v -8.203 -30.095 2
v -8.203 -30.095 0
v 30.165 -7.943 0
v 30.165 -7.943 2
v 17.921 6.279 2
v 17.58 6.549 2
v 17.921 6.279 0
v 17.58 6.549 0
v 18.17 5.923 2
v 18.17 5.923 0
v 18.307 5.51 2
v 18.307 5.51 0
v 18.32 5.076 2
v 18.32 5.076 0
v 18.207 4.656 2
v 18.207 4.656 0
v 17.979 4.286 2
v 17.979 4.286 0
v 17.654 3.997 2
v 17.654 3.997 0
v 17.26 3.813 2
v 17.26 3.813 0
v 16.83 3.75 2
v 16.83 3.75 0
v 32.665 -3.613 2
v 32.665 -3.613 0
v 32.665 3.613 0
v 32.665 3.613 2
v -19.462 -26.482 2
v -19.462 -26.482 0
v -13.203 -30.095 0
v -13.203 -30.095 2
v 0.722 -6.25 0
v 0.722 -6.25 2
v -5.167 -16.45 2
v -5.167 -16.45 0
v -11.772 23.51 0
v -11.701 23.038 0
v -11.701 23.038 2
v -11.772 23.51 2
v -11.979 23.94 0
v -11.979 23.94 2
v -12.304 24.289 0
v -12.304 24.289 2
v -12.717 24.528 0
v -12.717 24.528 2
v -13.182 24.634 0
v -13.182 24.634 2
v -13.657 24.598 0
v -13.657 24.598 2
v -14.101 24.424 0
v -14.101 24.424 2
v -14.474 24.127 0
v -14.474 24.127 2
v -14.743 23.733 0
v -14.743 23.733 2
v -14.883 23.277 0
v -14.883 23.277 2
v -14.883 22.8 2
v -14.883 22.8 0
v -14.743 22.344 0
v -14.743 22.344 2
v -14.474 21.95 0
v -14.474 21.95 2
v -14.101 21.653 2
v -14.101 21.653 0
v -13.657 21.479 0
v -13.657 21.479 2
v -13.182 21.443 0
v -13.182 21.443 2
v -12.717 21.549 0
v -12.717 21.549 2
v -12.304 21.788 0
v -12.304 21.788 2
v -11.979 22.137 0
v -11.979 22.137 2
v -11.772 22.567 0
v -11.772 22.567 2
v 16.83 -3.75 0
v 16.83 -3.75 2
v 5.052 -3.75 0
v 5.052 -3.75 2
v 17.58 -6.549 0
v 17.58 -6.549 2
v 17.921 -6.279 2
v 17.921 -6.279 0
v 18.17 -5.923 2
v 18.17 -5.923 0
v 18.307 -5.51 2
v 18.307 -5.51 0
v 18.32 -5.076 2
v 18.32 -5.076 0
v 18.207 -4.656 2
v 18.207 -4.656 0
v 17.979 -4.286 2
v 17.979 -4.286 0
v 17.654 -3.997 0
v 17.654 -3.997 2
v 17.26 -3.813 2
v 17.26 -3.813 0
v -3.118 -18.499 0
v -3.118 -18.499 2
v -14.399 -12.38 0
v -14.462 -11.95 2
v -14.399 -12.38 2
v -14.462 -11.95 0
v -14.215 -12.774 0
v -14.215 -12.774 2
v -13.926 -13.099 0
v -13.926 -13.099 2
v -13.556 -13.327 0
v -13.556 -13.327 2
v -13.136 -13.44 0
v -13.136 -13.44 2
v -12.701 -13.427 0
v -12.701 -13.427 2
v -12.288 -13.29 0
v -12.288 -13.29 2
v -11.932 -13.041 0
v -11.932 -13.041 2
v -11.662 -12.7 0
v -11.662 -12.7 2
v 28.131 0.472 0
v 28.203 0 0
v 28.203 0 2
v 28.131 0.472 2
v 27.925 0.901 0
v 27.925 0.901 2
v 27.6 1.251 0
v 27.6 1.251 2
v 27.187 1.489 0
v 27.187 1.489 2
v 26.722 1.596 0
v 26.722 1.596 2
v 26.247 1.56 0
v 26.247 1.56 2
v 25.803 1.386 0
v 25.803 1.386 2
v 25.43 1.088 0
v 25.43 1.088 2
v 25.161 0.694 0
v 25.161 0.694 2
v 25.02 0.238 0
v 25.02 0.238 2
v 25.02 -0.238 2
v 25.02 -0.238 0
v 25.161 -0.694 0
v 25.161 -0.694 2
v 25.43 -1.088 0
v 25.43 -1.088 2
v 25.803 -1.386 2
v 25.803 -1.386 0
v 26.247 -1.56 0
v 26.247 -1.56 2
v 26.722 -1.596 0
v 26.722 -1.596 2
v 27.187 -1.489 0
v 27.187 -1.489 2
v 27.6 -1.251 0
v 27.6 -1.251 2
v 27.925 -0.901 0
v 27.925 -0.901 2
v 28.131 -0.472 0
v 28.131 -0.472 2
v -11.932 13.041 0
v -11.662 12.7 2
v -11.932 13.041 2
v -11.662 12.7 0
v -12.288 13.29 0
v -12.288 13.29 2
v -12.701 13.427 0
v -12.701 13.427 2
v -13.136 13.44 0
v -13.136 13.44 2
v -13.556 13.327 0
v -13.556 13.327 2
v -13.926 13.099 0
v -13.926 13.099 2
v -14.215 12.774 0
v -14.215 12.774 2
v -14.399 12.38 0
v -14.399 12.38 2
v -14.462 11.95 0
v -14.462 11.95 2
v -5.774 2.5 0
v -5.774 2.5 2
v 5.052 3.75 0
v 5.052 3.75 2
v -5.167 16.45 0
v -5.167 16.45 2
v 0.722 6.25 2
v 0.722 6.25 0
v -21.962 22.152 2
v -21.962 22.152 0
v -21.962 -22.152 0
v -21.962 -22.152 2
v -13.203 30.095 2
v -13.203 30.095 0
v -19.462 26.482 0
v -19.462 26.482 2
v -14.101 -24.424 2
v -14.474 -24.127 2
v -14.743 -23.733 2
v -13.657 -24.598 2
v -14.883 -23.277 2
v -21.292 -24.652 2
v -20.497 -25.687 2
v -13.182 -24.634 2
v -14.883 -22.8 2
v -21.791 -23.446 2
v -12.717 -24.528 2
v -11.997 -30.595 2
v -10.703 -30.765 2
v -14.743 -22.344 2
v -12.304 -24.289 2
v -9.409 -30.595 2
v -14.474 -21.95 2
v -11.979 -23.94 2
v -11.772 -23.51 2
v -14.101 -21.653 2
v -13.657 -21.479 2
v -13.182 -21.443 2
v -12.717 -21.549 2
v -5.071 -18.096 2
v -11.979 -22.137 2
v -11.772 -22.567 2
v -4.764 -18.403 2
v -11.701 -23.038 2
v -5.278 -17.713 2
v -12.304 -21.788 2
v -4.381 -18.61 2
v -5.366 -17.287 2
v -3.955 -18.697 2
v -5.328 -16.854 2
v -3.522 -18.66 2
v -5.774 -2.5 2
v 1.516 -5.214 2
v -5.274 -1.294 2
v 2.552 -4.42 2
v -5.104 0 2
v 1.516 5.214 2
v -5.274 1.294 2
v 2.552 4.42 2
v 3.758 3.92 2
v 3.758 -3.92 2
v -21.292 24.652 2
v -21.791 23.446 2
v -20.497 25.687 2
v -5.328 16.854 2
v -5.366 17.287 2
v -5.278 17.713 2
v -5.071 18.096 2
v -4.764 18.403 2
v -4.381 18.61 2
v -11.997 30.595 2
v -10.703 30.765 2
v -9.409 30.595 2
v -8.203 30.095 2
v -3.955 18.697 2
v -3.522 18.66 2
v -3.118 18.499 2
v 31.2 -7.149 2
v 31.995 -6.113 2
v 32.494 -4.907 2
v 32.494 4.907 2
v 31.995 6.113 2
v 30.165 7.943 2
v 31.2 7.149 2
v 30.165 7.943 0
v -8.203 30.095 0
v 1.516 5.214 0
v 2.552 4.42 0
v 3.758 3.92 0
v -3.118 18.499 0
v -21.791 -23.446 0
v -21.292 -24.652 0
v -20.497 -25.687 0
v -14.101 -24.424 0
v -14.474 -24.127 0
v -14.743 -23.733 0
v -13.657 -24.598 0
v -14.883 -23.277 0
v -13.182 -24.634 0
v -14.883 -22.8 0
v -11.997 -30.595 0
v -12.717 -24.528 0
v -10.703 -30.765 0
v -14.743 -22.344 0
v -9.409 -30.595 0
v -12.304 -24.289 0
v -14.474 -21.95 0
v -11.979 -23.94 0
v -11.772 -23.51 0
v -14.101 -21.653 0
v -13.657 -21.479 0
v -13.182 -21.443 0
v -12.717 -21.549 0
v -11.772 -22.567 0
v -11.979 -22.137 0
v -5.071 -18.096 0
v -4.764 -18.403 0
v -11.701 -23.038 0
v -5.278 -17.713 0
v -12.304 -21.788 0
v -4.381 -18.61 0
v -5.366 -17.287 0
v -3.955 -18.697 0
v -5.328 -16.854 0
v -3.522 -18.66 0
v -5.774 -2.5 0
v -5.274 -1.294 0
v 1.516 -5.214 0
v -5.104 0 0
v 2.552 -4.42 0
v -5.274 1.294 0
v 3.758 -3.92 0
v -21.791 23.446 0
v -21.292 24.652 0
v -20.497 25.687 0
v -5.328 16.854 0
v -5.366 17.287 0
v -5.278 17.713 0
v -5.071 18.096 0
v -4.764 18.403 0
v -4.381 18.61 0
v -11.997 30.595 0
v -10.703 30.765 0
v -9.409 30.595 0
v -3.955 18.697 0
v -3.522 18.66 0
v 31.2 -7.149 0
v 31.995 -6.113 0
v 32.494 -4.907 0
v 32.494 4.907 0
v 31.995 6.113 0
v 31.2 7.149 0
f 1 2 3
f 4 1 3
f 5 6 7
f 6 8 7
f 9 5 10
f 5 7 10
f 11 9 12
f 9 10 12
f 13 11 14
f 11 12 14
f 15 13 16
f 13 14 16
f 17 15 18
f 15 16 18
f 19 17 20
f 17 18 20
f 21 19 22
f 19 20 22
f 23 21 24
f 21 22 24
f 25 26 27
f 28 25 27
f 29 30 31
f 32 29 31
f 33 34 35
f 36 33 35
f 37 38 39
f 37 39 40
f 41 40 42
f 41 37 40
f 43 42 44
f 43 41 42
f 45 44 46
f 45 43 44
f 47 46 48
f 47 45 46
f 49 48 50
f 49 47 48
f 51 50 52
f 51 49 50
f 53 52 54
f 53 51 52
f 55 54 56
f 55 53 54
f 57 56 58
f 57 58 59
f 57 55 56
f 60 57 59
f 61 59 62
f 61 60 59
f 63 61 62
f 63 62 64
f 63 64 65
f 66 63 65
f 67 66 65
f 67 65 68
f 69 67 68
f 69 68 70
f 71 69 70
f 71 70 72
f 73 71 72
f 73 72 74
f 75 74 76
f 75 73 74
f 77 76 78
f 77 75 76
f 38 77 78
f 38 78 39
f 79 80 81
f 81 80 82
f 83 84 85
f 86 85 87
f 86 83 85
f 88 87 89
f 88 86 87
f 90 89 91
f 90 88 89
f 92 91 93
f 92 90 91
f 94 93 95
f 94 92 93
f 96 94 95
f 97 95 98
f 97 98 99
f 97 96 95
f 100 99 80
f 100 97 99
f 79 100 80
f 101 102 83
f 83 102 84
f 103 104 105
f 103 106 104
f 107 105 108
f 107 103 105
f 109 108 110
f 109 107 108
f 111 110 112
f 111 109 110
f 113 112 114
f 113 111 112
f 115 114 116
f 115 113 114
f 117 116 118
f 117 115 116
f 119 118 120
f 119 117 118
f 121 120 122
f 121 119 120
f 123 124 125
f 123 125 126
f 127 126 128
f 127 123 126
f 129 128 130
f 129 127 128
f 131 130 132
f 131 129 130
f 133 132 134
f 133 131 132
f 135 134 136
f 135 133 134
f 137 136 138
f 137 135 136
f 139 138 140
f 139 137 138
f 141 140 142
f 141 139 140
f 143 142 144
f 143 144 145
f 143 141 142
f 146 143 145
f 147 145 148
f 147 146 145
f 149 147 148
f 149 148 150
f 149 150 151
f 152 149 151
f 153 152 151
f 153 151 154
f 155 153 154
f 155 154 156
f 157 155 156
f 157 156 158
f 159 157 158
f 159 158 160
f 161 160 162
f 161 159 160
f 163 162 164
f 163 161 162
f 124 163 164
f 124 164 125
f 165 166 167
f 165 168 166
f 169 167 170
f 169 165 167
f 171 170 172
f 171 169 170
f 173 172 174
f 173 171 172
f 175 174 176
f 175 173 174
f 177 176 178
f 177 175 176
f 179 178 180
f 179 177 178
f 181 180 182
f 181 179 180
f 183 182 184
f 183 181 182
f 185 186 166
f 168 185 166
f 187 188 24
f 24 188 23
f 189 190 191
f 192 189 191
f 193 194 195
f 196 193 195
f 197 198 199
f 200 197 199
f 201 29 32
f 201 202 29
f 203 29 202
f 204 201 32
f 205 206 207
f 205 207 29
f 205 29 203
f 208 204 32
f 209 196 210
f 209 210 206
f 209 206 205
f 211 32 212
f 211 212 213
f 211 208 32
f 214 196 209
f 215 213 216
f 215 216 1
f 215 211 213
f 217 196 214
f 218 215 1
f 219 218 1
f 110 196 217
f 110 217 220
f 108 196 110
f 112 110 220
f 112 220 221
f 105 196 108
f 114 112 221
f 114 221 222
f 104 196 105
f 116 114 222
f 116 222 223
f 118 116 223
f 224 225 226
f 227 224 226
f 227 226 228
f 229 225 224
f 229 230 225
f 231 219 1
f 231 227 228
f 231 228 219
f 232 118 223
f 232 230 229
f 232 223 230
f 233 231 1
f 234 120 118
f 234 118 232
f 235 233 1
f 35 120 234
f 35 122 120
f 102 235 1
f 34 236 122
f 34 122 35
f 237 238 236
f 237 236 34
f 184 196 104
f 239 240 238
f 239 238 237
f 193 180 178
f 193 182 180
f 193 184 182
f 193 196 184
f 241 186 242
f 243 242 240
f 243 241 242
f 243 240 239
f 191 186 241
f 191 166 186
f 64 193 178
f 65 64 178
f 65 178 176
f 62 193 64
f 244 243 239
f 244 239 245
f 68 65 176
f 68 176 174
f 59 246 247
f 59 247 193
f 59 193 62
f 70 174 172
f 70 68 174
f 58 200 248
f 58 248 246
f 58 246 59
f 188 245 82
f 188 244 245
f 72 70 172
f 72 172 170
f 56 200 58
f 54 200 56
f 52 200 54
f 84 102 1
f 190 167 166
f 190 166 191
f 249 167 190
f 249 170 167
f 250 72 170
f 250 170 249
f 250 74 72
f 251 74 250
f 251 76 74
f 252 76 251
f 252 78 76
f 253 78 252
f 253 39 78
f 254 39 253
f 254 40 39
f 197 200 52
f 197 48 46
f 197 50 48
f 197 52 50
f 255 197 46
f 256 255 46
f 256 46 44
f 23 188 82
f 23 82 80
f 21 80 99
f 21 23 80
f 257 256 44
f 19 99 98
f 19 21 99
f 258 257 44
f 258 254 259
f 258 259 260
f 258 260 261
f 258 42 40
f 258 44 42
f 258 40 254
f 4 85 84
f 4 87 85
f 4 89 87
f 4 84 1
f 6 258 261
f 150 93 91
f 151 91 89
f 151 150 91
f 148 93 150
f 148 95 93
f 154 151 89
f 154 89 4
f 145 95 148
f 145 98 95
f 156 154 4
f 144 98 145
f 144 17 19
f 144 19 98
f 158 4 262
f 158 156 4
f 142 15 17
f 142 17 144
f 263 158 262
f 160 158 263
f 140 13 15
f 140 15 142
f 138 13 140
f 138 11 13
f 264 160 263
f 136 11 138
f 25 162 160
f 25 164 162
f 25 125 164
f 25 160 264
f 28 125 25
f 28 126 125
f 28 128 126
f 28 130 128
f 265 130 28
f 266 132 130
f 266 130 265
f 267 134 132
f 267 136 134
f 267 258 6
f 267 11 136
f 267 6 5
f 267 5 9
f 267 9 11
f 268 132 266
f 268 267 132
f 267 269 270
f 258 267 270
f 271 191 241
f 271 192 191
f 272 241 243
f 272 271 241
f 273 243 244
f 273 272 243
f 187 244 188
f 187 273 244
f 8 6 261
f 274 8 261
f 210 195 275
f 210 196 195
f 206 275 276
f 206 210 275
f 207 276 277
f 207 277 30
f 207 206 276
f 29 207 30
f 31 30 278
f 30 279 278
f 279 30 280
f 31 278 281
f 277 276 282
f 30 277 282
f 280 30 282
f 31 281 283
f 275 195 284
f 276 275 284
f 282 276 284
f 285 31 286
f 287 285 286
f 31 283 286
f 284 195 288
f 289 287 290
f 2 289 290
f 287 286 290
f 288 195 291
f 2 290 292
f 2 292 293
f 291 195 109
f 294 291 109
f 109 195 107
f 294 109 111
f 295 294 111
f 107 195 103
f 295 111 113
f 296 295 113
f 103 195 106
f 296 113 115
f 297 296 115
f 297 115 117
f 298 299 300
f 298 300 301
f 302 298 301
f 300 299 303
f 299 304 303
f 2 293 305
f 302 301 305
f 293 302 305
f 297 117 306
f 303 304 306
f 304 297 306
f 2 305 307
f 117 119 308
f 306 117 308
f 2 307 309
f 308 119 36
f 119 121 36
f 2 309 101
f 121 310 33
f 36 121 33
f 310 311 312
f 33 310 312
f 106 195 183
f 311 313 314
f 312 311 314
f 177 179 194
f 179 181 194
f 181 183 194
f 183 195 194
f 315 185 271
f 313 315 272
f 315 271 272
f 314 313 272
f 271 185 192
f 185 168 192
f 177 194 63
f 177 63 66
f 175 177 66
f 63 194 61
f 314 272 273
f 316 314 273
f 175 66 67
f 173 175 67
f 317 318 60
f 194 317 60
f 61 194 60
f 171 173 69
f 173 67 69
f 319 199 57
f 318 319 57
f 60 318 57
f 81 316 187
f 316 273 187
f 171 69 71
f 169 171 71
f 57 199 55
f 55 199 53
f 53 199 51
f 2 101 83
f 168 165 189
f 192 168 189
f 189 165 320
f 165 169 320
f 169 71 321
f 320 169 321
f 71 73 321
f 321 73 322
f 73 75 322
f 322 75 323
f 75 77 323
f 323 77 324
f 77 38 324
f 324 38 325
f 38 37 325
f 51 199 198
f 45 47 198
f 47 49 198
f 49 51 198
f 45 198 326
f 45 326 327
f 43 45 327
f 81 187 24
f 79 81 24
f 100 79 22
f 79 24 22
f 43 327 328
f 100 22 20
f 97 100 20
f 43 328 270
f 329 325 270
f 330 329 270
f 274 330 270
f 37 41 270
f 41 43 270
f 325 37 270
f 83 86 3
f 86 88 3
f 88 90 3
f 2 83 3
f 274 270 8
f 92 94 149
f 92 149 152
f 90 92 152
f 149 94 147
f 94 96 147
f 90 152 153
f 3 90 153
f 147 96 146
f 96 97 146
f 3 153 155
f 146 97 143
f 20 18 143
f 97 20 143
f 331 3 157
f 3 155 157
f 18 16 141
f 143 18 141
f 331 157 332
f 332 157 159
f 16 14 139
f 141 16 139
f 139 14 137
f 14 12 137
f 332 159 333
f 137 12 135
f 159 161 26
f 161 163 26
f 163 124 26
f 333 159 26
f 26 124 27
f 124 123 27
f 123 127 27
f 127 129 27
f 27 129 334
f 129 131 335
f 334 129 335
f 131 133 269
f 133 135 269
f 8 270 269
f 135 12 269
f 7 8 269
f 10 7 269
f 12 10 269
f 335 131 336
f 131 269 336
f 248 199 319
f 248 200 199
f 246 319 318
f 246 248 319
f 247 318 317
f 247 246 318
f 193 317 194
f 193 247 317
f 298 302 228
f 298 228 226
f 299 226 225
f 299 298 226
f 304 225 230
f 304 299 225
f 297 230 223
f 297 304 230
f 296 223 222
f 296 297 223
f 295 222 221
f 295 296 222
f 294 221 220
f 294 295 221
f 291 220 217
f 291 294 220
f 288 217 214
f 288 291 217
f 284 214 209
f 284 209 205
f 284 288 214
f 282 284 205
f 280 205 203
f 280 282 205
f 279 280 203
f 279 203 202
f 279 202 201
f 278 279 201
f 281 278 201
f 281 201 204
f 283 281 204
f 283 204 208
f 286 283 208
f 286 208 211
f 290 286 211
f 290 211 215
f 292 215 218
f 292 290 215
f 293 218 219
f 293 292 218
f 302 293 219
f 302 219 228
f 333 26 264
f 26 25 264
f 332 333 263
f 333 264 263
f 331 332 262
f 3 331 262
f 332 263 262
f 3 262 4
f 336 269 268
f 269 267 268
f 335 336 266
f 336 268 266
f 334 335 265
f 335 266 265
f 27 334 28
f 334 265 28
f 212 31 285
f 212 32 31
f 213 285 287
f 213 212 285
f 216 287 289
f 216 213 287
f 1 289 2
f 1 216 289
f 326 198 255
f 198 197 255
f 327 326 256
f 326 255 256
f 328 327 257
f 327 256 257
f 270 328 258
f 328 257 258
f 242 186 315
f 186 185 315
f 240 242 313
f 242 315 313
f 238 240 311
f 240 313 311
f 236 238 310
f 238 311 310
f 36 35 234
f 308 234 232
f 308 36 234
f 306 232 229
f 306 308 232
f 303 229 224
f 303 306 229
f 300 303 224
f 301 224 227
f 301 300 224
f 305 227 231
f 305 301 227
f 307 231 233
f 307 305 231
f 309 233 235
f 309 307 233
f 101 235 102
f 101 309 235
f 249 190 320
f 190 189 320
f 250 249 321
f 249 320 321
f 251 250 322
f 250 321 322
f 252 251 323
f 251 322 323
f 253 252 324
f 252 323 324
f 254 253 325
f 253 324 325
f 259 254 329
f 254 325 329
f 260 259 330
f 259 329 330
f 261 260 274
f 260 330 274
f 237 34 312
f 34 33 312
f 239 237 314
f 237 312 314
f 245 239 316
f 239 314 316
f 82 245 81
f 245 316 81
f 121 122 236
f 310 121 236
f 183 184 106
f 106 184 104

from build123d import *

# Parameters (mm, degrees)
SKETCH_1_R          = 1.6
EXTRUDE_1_DEPTH     = 2
CUT_EXTRUDE_1_DEPTH = 10
FILLET_1_R          = 5
FILLET_2_R          = 1.5


with BuildPart() as part:
    # ｽｹｯﾁ1 → ﾎﾞｽ - 押し出し1 (new body)
    with BuildSketch(Plane.XY):
        Polygon((-10.703193979, 31.538475775), (-21.961524228, 25.038475775), (-21.961524228, -25.038475775), (-10.703193979, -31.538475775), (32.664718207, -6.5), (32.664718207, 6.5), align=None)
        with Locations((-13.30127019, 23.038475775)):
            Circle(SKETCH_1_R, mode=Mode.SUBTRACT)
        with Locations((-13.30127019, -23.038475775)):
            Circle(SKETCH_1_R, mode=Mode.SUBTRACT)
        with Locations((26.602540381, 0)):
            Circle(SKETCH_1_R, mode=Mode.SUBTRACT)
    extrude(amount=EXTRUDE_1_DEPTH)

    # ｽｹｯﾁ2 → ｶｯﾄ - 押し出し1 (cut)
    with BuildSketch(Plane.XY.offset(2)):
        Polygon((-4.330127019, 0), (-14.461524228, 17.548094718), (-14.461524228, -17.548094718), align=None)
        Polygon((2.165063509, -3.75), (-7.9663337, -21.298094718), (22.427857928, -3.75), align=None)
        Polygon((22.427857928, 3.75), (-7.9663337, 21.298094718), (2.165063509, 3.75), align=None)
    extrude(amount=-CUT_EXTRUDE_1_DEPTH, mode=Mode.SUBTRACT)

    # ﾌｨﾚｯﾄ1
    fillet_1_edges = [part.edges().sort_by_distance(p)[0] for p in [
        (32.664718207, 6.5, 1),
        (32.664718207, -6.5, 1),
        (-10.703193979, -31.538475775, 1),
        (-21.961524228, -25.038475775, 1),
        (-21.961524228, 25.038475775, 1),
        (-10.703193979, 31.538475775, 1),
        (-4.330127019, 0, 1),
        (2.165063509, -3.75, 1),
        (2.165063509, 3.75, 1),
    ]]
    fillet(fillet_1_edges, radius=FILLET_1_R)

    # ﾌｨﾚｯﾄ2
    fillet_2_edges = [part.edges().sort_by_distance(p)[0] for p in [
        (-14.461524228, 17.548094718, 1),
        (-14.461524228, -17.548094718, 1),
        (22.427857928, -3.75, 1),
        (-7.9663337, -21.298094718, 1),
        (-7.9663337, 21.298094718, 1),
        (22.427857928, 3.75, 1),
    ]]
    fillet(fillet_2_edges, radius=FILLET_2_R)


solid = part.part
